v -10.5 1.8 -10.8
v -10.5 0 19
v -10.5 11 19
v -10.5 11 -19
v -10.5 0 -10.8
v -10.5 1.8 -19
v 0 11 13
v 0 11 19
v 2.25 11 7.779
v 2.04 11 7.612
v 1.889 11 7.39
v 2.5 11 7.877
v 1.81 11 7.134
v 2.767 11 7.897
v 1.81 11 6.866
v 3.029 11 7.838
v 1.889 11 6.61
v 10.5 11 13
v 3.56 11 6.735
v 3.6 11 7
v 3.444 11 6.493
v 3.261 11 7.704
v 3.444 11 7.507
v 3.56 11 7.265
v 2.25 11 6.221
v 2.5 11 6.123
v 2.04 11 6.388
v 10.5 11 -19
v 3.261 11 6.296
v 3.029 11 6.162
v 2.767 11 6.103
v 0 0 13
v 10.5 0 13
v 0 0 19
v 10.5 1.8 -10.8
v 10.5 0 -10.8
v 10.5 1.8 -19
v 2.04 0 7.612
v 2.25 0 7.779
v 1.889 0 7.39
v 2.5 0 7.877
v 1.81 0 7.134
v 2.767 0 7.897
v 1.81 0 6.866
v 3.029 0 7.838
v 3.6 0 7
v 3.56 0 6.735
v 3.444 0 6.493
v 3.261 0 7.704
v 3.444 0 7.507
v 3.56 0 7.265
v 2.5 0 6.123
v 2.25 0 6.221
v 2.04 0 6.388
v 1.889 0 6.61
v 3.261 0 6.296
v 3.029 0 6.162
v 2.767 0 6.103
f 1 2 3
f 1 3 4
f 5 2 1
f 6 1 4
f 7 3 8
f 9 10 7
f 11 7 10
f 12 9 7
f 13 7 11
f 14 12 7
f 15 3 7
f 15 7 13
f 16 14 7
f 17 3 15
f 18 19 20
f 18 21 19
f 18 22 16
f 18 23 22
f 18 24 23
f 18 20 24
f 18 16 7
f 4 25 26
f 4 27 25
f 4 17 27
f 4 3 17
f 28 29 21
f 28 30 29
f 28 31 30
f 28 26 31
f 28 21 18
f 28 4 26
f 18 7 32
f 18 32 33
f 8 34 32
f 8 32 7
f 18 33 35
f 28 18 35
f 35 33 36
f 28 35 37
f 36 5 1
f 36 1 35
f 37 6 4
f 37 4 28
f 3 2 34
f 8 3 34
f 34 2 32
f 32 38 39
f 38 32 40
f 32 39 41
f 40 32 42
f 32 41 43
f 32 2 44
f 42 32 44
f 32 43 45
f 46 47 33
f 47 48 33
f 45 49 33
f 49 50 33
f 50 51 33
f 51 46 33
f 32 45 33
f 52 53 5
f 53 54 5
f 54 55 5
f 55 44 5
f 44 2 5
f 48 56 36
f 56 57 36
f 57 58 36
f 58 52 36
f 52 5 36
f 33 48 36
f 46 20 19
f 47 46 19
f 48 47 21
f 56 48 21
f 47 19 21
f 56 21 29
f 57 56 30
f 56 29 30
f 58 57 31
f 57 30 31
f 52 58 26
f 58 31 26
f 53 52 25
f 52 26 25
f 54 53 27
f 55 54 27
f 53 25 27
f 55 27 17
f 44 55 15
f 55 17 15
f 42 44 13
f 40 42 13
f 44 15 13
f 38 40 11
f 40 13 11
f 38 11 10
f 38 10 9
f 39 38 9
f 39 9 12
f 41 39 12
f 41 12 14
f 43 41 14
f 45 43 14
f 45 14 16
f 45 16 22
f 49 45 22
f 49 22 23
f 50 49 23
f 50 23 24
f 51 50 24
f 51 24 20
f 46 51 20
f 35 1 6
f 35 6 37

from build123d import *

# Parameters (mm, degrees)
SKETCH_1_W          = 21
SKETCH_1_H          = 38
EXTRUDE_1_DEPTH     = 11
SKETCH_2_W          = 21
SKETCH_2_H          = 8.2
CUT_EXTRUDE_1_DEPTH = 1.8
SKETCH_3_W          = 10.5
SKETCH_3_H          = 11
CUT_EXTRUDE_2_DEPTH = 6
SKETCH_5_R          = 0.9
CUT_EXTRUDE_3_DEPTH = 12


with BuildPart() as part:
    # 草图1 → 凸台-拉伸1 (new body)
    with BuildSketch(Plane(origin=(0, 0, 0), x_dir=(1, 0, 0), z_dir=(0, 1, 0))):
        Rectangle(SKETCH_1_W, SKETCH_1_H)
    extrude(amount=EXTRUDE_1_DEPTH)

    # 草图2 → 切除-拉伸1 (cut)
    with BuildSketch(Plane.XZ):
        with Locations((0, -14.9)):
            Rectangle(SKETCH_2_W, SKETCH_2_H)
    extrude(amount=-CUT_EXTRUDE_1_DEPTH, mode=Mode.SUBTRACT)

    # 草图3 → 切除-拉伸2 (cut)
    with BuildSketch(Plane.XY.offset(19)):
        with Locations((5.25, 5.5)):
            Rectangle(SKETCH_3_W, SKETCH_3_H)
    extrude(amount=-CUT_EXTRUDE_2_DEPTH, mode=Mode.SUBTRACT)

    # 草图5 → 切除-拉伸3 (cut, through all)
    with BuildSketch(Plane(origin=(0, 11, 0), x_dir=(1, 0, 0), z_dir=(0, 1, 0))):
        with Locations((2.7, -7)):
            Circle(SKETCH_5_R)
    extrude(amount=-CUT_EXTRUDE_3_DEPTH, mode=Mode.SUBTRACT)


solid = part.part
